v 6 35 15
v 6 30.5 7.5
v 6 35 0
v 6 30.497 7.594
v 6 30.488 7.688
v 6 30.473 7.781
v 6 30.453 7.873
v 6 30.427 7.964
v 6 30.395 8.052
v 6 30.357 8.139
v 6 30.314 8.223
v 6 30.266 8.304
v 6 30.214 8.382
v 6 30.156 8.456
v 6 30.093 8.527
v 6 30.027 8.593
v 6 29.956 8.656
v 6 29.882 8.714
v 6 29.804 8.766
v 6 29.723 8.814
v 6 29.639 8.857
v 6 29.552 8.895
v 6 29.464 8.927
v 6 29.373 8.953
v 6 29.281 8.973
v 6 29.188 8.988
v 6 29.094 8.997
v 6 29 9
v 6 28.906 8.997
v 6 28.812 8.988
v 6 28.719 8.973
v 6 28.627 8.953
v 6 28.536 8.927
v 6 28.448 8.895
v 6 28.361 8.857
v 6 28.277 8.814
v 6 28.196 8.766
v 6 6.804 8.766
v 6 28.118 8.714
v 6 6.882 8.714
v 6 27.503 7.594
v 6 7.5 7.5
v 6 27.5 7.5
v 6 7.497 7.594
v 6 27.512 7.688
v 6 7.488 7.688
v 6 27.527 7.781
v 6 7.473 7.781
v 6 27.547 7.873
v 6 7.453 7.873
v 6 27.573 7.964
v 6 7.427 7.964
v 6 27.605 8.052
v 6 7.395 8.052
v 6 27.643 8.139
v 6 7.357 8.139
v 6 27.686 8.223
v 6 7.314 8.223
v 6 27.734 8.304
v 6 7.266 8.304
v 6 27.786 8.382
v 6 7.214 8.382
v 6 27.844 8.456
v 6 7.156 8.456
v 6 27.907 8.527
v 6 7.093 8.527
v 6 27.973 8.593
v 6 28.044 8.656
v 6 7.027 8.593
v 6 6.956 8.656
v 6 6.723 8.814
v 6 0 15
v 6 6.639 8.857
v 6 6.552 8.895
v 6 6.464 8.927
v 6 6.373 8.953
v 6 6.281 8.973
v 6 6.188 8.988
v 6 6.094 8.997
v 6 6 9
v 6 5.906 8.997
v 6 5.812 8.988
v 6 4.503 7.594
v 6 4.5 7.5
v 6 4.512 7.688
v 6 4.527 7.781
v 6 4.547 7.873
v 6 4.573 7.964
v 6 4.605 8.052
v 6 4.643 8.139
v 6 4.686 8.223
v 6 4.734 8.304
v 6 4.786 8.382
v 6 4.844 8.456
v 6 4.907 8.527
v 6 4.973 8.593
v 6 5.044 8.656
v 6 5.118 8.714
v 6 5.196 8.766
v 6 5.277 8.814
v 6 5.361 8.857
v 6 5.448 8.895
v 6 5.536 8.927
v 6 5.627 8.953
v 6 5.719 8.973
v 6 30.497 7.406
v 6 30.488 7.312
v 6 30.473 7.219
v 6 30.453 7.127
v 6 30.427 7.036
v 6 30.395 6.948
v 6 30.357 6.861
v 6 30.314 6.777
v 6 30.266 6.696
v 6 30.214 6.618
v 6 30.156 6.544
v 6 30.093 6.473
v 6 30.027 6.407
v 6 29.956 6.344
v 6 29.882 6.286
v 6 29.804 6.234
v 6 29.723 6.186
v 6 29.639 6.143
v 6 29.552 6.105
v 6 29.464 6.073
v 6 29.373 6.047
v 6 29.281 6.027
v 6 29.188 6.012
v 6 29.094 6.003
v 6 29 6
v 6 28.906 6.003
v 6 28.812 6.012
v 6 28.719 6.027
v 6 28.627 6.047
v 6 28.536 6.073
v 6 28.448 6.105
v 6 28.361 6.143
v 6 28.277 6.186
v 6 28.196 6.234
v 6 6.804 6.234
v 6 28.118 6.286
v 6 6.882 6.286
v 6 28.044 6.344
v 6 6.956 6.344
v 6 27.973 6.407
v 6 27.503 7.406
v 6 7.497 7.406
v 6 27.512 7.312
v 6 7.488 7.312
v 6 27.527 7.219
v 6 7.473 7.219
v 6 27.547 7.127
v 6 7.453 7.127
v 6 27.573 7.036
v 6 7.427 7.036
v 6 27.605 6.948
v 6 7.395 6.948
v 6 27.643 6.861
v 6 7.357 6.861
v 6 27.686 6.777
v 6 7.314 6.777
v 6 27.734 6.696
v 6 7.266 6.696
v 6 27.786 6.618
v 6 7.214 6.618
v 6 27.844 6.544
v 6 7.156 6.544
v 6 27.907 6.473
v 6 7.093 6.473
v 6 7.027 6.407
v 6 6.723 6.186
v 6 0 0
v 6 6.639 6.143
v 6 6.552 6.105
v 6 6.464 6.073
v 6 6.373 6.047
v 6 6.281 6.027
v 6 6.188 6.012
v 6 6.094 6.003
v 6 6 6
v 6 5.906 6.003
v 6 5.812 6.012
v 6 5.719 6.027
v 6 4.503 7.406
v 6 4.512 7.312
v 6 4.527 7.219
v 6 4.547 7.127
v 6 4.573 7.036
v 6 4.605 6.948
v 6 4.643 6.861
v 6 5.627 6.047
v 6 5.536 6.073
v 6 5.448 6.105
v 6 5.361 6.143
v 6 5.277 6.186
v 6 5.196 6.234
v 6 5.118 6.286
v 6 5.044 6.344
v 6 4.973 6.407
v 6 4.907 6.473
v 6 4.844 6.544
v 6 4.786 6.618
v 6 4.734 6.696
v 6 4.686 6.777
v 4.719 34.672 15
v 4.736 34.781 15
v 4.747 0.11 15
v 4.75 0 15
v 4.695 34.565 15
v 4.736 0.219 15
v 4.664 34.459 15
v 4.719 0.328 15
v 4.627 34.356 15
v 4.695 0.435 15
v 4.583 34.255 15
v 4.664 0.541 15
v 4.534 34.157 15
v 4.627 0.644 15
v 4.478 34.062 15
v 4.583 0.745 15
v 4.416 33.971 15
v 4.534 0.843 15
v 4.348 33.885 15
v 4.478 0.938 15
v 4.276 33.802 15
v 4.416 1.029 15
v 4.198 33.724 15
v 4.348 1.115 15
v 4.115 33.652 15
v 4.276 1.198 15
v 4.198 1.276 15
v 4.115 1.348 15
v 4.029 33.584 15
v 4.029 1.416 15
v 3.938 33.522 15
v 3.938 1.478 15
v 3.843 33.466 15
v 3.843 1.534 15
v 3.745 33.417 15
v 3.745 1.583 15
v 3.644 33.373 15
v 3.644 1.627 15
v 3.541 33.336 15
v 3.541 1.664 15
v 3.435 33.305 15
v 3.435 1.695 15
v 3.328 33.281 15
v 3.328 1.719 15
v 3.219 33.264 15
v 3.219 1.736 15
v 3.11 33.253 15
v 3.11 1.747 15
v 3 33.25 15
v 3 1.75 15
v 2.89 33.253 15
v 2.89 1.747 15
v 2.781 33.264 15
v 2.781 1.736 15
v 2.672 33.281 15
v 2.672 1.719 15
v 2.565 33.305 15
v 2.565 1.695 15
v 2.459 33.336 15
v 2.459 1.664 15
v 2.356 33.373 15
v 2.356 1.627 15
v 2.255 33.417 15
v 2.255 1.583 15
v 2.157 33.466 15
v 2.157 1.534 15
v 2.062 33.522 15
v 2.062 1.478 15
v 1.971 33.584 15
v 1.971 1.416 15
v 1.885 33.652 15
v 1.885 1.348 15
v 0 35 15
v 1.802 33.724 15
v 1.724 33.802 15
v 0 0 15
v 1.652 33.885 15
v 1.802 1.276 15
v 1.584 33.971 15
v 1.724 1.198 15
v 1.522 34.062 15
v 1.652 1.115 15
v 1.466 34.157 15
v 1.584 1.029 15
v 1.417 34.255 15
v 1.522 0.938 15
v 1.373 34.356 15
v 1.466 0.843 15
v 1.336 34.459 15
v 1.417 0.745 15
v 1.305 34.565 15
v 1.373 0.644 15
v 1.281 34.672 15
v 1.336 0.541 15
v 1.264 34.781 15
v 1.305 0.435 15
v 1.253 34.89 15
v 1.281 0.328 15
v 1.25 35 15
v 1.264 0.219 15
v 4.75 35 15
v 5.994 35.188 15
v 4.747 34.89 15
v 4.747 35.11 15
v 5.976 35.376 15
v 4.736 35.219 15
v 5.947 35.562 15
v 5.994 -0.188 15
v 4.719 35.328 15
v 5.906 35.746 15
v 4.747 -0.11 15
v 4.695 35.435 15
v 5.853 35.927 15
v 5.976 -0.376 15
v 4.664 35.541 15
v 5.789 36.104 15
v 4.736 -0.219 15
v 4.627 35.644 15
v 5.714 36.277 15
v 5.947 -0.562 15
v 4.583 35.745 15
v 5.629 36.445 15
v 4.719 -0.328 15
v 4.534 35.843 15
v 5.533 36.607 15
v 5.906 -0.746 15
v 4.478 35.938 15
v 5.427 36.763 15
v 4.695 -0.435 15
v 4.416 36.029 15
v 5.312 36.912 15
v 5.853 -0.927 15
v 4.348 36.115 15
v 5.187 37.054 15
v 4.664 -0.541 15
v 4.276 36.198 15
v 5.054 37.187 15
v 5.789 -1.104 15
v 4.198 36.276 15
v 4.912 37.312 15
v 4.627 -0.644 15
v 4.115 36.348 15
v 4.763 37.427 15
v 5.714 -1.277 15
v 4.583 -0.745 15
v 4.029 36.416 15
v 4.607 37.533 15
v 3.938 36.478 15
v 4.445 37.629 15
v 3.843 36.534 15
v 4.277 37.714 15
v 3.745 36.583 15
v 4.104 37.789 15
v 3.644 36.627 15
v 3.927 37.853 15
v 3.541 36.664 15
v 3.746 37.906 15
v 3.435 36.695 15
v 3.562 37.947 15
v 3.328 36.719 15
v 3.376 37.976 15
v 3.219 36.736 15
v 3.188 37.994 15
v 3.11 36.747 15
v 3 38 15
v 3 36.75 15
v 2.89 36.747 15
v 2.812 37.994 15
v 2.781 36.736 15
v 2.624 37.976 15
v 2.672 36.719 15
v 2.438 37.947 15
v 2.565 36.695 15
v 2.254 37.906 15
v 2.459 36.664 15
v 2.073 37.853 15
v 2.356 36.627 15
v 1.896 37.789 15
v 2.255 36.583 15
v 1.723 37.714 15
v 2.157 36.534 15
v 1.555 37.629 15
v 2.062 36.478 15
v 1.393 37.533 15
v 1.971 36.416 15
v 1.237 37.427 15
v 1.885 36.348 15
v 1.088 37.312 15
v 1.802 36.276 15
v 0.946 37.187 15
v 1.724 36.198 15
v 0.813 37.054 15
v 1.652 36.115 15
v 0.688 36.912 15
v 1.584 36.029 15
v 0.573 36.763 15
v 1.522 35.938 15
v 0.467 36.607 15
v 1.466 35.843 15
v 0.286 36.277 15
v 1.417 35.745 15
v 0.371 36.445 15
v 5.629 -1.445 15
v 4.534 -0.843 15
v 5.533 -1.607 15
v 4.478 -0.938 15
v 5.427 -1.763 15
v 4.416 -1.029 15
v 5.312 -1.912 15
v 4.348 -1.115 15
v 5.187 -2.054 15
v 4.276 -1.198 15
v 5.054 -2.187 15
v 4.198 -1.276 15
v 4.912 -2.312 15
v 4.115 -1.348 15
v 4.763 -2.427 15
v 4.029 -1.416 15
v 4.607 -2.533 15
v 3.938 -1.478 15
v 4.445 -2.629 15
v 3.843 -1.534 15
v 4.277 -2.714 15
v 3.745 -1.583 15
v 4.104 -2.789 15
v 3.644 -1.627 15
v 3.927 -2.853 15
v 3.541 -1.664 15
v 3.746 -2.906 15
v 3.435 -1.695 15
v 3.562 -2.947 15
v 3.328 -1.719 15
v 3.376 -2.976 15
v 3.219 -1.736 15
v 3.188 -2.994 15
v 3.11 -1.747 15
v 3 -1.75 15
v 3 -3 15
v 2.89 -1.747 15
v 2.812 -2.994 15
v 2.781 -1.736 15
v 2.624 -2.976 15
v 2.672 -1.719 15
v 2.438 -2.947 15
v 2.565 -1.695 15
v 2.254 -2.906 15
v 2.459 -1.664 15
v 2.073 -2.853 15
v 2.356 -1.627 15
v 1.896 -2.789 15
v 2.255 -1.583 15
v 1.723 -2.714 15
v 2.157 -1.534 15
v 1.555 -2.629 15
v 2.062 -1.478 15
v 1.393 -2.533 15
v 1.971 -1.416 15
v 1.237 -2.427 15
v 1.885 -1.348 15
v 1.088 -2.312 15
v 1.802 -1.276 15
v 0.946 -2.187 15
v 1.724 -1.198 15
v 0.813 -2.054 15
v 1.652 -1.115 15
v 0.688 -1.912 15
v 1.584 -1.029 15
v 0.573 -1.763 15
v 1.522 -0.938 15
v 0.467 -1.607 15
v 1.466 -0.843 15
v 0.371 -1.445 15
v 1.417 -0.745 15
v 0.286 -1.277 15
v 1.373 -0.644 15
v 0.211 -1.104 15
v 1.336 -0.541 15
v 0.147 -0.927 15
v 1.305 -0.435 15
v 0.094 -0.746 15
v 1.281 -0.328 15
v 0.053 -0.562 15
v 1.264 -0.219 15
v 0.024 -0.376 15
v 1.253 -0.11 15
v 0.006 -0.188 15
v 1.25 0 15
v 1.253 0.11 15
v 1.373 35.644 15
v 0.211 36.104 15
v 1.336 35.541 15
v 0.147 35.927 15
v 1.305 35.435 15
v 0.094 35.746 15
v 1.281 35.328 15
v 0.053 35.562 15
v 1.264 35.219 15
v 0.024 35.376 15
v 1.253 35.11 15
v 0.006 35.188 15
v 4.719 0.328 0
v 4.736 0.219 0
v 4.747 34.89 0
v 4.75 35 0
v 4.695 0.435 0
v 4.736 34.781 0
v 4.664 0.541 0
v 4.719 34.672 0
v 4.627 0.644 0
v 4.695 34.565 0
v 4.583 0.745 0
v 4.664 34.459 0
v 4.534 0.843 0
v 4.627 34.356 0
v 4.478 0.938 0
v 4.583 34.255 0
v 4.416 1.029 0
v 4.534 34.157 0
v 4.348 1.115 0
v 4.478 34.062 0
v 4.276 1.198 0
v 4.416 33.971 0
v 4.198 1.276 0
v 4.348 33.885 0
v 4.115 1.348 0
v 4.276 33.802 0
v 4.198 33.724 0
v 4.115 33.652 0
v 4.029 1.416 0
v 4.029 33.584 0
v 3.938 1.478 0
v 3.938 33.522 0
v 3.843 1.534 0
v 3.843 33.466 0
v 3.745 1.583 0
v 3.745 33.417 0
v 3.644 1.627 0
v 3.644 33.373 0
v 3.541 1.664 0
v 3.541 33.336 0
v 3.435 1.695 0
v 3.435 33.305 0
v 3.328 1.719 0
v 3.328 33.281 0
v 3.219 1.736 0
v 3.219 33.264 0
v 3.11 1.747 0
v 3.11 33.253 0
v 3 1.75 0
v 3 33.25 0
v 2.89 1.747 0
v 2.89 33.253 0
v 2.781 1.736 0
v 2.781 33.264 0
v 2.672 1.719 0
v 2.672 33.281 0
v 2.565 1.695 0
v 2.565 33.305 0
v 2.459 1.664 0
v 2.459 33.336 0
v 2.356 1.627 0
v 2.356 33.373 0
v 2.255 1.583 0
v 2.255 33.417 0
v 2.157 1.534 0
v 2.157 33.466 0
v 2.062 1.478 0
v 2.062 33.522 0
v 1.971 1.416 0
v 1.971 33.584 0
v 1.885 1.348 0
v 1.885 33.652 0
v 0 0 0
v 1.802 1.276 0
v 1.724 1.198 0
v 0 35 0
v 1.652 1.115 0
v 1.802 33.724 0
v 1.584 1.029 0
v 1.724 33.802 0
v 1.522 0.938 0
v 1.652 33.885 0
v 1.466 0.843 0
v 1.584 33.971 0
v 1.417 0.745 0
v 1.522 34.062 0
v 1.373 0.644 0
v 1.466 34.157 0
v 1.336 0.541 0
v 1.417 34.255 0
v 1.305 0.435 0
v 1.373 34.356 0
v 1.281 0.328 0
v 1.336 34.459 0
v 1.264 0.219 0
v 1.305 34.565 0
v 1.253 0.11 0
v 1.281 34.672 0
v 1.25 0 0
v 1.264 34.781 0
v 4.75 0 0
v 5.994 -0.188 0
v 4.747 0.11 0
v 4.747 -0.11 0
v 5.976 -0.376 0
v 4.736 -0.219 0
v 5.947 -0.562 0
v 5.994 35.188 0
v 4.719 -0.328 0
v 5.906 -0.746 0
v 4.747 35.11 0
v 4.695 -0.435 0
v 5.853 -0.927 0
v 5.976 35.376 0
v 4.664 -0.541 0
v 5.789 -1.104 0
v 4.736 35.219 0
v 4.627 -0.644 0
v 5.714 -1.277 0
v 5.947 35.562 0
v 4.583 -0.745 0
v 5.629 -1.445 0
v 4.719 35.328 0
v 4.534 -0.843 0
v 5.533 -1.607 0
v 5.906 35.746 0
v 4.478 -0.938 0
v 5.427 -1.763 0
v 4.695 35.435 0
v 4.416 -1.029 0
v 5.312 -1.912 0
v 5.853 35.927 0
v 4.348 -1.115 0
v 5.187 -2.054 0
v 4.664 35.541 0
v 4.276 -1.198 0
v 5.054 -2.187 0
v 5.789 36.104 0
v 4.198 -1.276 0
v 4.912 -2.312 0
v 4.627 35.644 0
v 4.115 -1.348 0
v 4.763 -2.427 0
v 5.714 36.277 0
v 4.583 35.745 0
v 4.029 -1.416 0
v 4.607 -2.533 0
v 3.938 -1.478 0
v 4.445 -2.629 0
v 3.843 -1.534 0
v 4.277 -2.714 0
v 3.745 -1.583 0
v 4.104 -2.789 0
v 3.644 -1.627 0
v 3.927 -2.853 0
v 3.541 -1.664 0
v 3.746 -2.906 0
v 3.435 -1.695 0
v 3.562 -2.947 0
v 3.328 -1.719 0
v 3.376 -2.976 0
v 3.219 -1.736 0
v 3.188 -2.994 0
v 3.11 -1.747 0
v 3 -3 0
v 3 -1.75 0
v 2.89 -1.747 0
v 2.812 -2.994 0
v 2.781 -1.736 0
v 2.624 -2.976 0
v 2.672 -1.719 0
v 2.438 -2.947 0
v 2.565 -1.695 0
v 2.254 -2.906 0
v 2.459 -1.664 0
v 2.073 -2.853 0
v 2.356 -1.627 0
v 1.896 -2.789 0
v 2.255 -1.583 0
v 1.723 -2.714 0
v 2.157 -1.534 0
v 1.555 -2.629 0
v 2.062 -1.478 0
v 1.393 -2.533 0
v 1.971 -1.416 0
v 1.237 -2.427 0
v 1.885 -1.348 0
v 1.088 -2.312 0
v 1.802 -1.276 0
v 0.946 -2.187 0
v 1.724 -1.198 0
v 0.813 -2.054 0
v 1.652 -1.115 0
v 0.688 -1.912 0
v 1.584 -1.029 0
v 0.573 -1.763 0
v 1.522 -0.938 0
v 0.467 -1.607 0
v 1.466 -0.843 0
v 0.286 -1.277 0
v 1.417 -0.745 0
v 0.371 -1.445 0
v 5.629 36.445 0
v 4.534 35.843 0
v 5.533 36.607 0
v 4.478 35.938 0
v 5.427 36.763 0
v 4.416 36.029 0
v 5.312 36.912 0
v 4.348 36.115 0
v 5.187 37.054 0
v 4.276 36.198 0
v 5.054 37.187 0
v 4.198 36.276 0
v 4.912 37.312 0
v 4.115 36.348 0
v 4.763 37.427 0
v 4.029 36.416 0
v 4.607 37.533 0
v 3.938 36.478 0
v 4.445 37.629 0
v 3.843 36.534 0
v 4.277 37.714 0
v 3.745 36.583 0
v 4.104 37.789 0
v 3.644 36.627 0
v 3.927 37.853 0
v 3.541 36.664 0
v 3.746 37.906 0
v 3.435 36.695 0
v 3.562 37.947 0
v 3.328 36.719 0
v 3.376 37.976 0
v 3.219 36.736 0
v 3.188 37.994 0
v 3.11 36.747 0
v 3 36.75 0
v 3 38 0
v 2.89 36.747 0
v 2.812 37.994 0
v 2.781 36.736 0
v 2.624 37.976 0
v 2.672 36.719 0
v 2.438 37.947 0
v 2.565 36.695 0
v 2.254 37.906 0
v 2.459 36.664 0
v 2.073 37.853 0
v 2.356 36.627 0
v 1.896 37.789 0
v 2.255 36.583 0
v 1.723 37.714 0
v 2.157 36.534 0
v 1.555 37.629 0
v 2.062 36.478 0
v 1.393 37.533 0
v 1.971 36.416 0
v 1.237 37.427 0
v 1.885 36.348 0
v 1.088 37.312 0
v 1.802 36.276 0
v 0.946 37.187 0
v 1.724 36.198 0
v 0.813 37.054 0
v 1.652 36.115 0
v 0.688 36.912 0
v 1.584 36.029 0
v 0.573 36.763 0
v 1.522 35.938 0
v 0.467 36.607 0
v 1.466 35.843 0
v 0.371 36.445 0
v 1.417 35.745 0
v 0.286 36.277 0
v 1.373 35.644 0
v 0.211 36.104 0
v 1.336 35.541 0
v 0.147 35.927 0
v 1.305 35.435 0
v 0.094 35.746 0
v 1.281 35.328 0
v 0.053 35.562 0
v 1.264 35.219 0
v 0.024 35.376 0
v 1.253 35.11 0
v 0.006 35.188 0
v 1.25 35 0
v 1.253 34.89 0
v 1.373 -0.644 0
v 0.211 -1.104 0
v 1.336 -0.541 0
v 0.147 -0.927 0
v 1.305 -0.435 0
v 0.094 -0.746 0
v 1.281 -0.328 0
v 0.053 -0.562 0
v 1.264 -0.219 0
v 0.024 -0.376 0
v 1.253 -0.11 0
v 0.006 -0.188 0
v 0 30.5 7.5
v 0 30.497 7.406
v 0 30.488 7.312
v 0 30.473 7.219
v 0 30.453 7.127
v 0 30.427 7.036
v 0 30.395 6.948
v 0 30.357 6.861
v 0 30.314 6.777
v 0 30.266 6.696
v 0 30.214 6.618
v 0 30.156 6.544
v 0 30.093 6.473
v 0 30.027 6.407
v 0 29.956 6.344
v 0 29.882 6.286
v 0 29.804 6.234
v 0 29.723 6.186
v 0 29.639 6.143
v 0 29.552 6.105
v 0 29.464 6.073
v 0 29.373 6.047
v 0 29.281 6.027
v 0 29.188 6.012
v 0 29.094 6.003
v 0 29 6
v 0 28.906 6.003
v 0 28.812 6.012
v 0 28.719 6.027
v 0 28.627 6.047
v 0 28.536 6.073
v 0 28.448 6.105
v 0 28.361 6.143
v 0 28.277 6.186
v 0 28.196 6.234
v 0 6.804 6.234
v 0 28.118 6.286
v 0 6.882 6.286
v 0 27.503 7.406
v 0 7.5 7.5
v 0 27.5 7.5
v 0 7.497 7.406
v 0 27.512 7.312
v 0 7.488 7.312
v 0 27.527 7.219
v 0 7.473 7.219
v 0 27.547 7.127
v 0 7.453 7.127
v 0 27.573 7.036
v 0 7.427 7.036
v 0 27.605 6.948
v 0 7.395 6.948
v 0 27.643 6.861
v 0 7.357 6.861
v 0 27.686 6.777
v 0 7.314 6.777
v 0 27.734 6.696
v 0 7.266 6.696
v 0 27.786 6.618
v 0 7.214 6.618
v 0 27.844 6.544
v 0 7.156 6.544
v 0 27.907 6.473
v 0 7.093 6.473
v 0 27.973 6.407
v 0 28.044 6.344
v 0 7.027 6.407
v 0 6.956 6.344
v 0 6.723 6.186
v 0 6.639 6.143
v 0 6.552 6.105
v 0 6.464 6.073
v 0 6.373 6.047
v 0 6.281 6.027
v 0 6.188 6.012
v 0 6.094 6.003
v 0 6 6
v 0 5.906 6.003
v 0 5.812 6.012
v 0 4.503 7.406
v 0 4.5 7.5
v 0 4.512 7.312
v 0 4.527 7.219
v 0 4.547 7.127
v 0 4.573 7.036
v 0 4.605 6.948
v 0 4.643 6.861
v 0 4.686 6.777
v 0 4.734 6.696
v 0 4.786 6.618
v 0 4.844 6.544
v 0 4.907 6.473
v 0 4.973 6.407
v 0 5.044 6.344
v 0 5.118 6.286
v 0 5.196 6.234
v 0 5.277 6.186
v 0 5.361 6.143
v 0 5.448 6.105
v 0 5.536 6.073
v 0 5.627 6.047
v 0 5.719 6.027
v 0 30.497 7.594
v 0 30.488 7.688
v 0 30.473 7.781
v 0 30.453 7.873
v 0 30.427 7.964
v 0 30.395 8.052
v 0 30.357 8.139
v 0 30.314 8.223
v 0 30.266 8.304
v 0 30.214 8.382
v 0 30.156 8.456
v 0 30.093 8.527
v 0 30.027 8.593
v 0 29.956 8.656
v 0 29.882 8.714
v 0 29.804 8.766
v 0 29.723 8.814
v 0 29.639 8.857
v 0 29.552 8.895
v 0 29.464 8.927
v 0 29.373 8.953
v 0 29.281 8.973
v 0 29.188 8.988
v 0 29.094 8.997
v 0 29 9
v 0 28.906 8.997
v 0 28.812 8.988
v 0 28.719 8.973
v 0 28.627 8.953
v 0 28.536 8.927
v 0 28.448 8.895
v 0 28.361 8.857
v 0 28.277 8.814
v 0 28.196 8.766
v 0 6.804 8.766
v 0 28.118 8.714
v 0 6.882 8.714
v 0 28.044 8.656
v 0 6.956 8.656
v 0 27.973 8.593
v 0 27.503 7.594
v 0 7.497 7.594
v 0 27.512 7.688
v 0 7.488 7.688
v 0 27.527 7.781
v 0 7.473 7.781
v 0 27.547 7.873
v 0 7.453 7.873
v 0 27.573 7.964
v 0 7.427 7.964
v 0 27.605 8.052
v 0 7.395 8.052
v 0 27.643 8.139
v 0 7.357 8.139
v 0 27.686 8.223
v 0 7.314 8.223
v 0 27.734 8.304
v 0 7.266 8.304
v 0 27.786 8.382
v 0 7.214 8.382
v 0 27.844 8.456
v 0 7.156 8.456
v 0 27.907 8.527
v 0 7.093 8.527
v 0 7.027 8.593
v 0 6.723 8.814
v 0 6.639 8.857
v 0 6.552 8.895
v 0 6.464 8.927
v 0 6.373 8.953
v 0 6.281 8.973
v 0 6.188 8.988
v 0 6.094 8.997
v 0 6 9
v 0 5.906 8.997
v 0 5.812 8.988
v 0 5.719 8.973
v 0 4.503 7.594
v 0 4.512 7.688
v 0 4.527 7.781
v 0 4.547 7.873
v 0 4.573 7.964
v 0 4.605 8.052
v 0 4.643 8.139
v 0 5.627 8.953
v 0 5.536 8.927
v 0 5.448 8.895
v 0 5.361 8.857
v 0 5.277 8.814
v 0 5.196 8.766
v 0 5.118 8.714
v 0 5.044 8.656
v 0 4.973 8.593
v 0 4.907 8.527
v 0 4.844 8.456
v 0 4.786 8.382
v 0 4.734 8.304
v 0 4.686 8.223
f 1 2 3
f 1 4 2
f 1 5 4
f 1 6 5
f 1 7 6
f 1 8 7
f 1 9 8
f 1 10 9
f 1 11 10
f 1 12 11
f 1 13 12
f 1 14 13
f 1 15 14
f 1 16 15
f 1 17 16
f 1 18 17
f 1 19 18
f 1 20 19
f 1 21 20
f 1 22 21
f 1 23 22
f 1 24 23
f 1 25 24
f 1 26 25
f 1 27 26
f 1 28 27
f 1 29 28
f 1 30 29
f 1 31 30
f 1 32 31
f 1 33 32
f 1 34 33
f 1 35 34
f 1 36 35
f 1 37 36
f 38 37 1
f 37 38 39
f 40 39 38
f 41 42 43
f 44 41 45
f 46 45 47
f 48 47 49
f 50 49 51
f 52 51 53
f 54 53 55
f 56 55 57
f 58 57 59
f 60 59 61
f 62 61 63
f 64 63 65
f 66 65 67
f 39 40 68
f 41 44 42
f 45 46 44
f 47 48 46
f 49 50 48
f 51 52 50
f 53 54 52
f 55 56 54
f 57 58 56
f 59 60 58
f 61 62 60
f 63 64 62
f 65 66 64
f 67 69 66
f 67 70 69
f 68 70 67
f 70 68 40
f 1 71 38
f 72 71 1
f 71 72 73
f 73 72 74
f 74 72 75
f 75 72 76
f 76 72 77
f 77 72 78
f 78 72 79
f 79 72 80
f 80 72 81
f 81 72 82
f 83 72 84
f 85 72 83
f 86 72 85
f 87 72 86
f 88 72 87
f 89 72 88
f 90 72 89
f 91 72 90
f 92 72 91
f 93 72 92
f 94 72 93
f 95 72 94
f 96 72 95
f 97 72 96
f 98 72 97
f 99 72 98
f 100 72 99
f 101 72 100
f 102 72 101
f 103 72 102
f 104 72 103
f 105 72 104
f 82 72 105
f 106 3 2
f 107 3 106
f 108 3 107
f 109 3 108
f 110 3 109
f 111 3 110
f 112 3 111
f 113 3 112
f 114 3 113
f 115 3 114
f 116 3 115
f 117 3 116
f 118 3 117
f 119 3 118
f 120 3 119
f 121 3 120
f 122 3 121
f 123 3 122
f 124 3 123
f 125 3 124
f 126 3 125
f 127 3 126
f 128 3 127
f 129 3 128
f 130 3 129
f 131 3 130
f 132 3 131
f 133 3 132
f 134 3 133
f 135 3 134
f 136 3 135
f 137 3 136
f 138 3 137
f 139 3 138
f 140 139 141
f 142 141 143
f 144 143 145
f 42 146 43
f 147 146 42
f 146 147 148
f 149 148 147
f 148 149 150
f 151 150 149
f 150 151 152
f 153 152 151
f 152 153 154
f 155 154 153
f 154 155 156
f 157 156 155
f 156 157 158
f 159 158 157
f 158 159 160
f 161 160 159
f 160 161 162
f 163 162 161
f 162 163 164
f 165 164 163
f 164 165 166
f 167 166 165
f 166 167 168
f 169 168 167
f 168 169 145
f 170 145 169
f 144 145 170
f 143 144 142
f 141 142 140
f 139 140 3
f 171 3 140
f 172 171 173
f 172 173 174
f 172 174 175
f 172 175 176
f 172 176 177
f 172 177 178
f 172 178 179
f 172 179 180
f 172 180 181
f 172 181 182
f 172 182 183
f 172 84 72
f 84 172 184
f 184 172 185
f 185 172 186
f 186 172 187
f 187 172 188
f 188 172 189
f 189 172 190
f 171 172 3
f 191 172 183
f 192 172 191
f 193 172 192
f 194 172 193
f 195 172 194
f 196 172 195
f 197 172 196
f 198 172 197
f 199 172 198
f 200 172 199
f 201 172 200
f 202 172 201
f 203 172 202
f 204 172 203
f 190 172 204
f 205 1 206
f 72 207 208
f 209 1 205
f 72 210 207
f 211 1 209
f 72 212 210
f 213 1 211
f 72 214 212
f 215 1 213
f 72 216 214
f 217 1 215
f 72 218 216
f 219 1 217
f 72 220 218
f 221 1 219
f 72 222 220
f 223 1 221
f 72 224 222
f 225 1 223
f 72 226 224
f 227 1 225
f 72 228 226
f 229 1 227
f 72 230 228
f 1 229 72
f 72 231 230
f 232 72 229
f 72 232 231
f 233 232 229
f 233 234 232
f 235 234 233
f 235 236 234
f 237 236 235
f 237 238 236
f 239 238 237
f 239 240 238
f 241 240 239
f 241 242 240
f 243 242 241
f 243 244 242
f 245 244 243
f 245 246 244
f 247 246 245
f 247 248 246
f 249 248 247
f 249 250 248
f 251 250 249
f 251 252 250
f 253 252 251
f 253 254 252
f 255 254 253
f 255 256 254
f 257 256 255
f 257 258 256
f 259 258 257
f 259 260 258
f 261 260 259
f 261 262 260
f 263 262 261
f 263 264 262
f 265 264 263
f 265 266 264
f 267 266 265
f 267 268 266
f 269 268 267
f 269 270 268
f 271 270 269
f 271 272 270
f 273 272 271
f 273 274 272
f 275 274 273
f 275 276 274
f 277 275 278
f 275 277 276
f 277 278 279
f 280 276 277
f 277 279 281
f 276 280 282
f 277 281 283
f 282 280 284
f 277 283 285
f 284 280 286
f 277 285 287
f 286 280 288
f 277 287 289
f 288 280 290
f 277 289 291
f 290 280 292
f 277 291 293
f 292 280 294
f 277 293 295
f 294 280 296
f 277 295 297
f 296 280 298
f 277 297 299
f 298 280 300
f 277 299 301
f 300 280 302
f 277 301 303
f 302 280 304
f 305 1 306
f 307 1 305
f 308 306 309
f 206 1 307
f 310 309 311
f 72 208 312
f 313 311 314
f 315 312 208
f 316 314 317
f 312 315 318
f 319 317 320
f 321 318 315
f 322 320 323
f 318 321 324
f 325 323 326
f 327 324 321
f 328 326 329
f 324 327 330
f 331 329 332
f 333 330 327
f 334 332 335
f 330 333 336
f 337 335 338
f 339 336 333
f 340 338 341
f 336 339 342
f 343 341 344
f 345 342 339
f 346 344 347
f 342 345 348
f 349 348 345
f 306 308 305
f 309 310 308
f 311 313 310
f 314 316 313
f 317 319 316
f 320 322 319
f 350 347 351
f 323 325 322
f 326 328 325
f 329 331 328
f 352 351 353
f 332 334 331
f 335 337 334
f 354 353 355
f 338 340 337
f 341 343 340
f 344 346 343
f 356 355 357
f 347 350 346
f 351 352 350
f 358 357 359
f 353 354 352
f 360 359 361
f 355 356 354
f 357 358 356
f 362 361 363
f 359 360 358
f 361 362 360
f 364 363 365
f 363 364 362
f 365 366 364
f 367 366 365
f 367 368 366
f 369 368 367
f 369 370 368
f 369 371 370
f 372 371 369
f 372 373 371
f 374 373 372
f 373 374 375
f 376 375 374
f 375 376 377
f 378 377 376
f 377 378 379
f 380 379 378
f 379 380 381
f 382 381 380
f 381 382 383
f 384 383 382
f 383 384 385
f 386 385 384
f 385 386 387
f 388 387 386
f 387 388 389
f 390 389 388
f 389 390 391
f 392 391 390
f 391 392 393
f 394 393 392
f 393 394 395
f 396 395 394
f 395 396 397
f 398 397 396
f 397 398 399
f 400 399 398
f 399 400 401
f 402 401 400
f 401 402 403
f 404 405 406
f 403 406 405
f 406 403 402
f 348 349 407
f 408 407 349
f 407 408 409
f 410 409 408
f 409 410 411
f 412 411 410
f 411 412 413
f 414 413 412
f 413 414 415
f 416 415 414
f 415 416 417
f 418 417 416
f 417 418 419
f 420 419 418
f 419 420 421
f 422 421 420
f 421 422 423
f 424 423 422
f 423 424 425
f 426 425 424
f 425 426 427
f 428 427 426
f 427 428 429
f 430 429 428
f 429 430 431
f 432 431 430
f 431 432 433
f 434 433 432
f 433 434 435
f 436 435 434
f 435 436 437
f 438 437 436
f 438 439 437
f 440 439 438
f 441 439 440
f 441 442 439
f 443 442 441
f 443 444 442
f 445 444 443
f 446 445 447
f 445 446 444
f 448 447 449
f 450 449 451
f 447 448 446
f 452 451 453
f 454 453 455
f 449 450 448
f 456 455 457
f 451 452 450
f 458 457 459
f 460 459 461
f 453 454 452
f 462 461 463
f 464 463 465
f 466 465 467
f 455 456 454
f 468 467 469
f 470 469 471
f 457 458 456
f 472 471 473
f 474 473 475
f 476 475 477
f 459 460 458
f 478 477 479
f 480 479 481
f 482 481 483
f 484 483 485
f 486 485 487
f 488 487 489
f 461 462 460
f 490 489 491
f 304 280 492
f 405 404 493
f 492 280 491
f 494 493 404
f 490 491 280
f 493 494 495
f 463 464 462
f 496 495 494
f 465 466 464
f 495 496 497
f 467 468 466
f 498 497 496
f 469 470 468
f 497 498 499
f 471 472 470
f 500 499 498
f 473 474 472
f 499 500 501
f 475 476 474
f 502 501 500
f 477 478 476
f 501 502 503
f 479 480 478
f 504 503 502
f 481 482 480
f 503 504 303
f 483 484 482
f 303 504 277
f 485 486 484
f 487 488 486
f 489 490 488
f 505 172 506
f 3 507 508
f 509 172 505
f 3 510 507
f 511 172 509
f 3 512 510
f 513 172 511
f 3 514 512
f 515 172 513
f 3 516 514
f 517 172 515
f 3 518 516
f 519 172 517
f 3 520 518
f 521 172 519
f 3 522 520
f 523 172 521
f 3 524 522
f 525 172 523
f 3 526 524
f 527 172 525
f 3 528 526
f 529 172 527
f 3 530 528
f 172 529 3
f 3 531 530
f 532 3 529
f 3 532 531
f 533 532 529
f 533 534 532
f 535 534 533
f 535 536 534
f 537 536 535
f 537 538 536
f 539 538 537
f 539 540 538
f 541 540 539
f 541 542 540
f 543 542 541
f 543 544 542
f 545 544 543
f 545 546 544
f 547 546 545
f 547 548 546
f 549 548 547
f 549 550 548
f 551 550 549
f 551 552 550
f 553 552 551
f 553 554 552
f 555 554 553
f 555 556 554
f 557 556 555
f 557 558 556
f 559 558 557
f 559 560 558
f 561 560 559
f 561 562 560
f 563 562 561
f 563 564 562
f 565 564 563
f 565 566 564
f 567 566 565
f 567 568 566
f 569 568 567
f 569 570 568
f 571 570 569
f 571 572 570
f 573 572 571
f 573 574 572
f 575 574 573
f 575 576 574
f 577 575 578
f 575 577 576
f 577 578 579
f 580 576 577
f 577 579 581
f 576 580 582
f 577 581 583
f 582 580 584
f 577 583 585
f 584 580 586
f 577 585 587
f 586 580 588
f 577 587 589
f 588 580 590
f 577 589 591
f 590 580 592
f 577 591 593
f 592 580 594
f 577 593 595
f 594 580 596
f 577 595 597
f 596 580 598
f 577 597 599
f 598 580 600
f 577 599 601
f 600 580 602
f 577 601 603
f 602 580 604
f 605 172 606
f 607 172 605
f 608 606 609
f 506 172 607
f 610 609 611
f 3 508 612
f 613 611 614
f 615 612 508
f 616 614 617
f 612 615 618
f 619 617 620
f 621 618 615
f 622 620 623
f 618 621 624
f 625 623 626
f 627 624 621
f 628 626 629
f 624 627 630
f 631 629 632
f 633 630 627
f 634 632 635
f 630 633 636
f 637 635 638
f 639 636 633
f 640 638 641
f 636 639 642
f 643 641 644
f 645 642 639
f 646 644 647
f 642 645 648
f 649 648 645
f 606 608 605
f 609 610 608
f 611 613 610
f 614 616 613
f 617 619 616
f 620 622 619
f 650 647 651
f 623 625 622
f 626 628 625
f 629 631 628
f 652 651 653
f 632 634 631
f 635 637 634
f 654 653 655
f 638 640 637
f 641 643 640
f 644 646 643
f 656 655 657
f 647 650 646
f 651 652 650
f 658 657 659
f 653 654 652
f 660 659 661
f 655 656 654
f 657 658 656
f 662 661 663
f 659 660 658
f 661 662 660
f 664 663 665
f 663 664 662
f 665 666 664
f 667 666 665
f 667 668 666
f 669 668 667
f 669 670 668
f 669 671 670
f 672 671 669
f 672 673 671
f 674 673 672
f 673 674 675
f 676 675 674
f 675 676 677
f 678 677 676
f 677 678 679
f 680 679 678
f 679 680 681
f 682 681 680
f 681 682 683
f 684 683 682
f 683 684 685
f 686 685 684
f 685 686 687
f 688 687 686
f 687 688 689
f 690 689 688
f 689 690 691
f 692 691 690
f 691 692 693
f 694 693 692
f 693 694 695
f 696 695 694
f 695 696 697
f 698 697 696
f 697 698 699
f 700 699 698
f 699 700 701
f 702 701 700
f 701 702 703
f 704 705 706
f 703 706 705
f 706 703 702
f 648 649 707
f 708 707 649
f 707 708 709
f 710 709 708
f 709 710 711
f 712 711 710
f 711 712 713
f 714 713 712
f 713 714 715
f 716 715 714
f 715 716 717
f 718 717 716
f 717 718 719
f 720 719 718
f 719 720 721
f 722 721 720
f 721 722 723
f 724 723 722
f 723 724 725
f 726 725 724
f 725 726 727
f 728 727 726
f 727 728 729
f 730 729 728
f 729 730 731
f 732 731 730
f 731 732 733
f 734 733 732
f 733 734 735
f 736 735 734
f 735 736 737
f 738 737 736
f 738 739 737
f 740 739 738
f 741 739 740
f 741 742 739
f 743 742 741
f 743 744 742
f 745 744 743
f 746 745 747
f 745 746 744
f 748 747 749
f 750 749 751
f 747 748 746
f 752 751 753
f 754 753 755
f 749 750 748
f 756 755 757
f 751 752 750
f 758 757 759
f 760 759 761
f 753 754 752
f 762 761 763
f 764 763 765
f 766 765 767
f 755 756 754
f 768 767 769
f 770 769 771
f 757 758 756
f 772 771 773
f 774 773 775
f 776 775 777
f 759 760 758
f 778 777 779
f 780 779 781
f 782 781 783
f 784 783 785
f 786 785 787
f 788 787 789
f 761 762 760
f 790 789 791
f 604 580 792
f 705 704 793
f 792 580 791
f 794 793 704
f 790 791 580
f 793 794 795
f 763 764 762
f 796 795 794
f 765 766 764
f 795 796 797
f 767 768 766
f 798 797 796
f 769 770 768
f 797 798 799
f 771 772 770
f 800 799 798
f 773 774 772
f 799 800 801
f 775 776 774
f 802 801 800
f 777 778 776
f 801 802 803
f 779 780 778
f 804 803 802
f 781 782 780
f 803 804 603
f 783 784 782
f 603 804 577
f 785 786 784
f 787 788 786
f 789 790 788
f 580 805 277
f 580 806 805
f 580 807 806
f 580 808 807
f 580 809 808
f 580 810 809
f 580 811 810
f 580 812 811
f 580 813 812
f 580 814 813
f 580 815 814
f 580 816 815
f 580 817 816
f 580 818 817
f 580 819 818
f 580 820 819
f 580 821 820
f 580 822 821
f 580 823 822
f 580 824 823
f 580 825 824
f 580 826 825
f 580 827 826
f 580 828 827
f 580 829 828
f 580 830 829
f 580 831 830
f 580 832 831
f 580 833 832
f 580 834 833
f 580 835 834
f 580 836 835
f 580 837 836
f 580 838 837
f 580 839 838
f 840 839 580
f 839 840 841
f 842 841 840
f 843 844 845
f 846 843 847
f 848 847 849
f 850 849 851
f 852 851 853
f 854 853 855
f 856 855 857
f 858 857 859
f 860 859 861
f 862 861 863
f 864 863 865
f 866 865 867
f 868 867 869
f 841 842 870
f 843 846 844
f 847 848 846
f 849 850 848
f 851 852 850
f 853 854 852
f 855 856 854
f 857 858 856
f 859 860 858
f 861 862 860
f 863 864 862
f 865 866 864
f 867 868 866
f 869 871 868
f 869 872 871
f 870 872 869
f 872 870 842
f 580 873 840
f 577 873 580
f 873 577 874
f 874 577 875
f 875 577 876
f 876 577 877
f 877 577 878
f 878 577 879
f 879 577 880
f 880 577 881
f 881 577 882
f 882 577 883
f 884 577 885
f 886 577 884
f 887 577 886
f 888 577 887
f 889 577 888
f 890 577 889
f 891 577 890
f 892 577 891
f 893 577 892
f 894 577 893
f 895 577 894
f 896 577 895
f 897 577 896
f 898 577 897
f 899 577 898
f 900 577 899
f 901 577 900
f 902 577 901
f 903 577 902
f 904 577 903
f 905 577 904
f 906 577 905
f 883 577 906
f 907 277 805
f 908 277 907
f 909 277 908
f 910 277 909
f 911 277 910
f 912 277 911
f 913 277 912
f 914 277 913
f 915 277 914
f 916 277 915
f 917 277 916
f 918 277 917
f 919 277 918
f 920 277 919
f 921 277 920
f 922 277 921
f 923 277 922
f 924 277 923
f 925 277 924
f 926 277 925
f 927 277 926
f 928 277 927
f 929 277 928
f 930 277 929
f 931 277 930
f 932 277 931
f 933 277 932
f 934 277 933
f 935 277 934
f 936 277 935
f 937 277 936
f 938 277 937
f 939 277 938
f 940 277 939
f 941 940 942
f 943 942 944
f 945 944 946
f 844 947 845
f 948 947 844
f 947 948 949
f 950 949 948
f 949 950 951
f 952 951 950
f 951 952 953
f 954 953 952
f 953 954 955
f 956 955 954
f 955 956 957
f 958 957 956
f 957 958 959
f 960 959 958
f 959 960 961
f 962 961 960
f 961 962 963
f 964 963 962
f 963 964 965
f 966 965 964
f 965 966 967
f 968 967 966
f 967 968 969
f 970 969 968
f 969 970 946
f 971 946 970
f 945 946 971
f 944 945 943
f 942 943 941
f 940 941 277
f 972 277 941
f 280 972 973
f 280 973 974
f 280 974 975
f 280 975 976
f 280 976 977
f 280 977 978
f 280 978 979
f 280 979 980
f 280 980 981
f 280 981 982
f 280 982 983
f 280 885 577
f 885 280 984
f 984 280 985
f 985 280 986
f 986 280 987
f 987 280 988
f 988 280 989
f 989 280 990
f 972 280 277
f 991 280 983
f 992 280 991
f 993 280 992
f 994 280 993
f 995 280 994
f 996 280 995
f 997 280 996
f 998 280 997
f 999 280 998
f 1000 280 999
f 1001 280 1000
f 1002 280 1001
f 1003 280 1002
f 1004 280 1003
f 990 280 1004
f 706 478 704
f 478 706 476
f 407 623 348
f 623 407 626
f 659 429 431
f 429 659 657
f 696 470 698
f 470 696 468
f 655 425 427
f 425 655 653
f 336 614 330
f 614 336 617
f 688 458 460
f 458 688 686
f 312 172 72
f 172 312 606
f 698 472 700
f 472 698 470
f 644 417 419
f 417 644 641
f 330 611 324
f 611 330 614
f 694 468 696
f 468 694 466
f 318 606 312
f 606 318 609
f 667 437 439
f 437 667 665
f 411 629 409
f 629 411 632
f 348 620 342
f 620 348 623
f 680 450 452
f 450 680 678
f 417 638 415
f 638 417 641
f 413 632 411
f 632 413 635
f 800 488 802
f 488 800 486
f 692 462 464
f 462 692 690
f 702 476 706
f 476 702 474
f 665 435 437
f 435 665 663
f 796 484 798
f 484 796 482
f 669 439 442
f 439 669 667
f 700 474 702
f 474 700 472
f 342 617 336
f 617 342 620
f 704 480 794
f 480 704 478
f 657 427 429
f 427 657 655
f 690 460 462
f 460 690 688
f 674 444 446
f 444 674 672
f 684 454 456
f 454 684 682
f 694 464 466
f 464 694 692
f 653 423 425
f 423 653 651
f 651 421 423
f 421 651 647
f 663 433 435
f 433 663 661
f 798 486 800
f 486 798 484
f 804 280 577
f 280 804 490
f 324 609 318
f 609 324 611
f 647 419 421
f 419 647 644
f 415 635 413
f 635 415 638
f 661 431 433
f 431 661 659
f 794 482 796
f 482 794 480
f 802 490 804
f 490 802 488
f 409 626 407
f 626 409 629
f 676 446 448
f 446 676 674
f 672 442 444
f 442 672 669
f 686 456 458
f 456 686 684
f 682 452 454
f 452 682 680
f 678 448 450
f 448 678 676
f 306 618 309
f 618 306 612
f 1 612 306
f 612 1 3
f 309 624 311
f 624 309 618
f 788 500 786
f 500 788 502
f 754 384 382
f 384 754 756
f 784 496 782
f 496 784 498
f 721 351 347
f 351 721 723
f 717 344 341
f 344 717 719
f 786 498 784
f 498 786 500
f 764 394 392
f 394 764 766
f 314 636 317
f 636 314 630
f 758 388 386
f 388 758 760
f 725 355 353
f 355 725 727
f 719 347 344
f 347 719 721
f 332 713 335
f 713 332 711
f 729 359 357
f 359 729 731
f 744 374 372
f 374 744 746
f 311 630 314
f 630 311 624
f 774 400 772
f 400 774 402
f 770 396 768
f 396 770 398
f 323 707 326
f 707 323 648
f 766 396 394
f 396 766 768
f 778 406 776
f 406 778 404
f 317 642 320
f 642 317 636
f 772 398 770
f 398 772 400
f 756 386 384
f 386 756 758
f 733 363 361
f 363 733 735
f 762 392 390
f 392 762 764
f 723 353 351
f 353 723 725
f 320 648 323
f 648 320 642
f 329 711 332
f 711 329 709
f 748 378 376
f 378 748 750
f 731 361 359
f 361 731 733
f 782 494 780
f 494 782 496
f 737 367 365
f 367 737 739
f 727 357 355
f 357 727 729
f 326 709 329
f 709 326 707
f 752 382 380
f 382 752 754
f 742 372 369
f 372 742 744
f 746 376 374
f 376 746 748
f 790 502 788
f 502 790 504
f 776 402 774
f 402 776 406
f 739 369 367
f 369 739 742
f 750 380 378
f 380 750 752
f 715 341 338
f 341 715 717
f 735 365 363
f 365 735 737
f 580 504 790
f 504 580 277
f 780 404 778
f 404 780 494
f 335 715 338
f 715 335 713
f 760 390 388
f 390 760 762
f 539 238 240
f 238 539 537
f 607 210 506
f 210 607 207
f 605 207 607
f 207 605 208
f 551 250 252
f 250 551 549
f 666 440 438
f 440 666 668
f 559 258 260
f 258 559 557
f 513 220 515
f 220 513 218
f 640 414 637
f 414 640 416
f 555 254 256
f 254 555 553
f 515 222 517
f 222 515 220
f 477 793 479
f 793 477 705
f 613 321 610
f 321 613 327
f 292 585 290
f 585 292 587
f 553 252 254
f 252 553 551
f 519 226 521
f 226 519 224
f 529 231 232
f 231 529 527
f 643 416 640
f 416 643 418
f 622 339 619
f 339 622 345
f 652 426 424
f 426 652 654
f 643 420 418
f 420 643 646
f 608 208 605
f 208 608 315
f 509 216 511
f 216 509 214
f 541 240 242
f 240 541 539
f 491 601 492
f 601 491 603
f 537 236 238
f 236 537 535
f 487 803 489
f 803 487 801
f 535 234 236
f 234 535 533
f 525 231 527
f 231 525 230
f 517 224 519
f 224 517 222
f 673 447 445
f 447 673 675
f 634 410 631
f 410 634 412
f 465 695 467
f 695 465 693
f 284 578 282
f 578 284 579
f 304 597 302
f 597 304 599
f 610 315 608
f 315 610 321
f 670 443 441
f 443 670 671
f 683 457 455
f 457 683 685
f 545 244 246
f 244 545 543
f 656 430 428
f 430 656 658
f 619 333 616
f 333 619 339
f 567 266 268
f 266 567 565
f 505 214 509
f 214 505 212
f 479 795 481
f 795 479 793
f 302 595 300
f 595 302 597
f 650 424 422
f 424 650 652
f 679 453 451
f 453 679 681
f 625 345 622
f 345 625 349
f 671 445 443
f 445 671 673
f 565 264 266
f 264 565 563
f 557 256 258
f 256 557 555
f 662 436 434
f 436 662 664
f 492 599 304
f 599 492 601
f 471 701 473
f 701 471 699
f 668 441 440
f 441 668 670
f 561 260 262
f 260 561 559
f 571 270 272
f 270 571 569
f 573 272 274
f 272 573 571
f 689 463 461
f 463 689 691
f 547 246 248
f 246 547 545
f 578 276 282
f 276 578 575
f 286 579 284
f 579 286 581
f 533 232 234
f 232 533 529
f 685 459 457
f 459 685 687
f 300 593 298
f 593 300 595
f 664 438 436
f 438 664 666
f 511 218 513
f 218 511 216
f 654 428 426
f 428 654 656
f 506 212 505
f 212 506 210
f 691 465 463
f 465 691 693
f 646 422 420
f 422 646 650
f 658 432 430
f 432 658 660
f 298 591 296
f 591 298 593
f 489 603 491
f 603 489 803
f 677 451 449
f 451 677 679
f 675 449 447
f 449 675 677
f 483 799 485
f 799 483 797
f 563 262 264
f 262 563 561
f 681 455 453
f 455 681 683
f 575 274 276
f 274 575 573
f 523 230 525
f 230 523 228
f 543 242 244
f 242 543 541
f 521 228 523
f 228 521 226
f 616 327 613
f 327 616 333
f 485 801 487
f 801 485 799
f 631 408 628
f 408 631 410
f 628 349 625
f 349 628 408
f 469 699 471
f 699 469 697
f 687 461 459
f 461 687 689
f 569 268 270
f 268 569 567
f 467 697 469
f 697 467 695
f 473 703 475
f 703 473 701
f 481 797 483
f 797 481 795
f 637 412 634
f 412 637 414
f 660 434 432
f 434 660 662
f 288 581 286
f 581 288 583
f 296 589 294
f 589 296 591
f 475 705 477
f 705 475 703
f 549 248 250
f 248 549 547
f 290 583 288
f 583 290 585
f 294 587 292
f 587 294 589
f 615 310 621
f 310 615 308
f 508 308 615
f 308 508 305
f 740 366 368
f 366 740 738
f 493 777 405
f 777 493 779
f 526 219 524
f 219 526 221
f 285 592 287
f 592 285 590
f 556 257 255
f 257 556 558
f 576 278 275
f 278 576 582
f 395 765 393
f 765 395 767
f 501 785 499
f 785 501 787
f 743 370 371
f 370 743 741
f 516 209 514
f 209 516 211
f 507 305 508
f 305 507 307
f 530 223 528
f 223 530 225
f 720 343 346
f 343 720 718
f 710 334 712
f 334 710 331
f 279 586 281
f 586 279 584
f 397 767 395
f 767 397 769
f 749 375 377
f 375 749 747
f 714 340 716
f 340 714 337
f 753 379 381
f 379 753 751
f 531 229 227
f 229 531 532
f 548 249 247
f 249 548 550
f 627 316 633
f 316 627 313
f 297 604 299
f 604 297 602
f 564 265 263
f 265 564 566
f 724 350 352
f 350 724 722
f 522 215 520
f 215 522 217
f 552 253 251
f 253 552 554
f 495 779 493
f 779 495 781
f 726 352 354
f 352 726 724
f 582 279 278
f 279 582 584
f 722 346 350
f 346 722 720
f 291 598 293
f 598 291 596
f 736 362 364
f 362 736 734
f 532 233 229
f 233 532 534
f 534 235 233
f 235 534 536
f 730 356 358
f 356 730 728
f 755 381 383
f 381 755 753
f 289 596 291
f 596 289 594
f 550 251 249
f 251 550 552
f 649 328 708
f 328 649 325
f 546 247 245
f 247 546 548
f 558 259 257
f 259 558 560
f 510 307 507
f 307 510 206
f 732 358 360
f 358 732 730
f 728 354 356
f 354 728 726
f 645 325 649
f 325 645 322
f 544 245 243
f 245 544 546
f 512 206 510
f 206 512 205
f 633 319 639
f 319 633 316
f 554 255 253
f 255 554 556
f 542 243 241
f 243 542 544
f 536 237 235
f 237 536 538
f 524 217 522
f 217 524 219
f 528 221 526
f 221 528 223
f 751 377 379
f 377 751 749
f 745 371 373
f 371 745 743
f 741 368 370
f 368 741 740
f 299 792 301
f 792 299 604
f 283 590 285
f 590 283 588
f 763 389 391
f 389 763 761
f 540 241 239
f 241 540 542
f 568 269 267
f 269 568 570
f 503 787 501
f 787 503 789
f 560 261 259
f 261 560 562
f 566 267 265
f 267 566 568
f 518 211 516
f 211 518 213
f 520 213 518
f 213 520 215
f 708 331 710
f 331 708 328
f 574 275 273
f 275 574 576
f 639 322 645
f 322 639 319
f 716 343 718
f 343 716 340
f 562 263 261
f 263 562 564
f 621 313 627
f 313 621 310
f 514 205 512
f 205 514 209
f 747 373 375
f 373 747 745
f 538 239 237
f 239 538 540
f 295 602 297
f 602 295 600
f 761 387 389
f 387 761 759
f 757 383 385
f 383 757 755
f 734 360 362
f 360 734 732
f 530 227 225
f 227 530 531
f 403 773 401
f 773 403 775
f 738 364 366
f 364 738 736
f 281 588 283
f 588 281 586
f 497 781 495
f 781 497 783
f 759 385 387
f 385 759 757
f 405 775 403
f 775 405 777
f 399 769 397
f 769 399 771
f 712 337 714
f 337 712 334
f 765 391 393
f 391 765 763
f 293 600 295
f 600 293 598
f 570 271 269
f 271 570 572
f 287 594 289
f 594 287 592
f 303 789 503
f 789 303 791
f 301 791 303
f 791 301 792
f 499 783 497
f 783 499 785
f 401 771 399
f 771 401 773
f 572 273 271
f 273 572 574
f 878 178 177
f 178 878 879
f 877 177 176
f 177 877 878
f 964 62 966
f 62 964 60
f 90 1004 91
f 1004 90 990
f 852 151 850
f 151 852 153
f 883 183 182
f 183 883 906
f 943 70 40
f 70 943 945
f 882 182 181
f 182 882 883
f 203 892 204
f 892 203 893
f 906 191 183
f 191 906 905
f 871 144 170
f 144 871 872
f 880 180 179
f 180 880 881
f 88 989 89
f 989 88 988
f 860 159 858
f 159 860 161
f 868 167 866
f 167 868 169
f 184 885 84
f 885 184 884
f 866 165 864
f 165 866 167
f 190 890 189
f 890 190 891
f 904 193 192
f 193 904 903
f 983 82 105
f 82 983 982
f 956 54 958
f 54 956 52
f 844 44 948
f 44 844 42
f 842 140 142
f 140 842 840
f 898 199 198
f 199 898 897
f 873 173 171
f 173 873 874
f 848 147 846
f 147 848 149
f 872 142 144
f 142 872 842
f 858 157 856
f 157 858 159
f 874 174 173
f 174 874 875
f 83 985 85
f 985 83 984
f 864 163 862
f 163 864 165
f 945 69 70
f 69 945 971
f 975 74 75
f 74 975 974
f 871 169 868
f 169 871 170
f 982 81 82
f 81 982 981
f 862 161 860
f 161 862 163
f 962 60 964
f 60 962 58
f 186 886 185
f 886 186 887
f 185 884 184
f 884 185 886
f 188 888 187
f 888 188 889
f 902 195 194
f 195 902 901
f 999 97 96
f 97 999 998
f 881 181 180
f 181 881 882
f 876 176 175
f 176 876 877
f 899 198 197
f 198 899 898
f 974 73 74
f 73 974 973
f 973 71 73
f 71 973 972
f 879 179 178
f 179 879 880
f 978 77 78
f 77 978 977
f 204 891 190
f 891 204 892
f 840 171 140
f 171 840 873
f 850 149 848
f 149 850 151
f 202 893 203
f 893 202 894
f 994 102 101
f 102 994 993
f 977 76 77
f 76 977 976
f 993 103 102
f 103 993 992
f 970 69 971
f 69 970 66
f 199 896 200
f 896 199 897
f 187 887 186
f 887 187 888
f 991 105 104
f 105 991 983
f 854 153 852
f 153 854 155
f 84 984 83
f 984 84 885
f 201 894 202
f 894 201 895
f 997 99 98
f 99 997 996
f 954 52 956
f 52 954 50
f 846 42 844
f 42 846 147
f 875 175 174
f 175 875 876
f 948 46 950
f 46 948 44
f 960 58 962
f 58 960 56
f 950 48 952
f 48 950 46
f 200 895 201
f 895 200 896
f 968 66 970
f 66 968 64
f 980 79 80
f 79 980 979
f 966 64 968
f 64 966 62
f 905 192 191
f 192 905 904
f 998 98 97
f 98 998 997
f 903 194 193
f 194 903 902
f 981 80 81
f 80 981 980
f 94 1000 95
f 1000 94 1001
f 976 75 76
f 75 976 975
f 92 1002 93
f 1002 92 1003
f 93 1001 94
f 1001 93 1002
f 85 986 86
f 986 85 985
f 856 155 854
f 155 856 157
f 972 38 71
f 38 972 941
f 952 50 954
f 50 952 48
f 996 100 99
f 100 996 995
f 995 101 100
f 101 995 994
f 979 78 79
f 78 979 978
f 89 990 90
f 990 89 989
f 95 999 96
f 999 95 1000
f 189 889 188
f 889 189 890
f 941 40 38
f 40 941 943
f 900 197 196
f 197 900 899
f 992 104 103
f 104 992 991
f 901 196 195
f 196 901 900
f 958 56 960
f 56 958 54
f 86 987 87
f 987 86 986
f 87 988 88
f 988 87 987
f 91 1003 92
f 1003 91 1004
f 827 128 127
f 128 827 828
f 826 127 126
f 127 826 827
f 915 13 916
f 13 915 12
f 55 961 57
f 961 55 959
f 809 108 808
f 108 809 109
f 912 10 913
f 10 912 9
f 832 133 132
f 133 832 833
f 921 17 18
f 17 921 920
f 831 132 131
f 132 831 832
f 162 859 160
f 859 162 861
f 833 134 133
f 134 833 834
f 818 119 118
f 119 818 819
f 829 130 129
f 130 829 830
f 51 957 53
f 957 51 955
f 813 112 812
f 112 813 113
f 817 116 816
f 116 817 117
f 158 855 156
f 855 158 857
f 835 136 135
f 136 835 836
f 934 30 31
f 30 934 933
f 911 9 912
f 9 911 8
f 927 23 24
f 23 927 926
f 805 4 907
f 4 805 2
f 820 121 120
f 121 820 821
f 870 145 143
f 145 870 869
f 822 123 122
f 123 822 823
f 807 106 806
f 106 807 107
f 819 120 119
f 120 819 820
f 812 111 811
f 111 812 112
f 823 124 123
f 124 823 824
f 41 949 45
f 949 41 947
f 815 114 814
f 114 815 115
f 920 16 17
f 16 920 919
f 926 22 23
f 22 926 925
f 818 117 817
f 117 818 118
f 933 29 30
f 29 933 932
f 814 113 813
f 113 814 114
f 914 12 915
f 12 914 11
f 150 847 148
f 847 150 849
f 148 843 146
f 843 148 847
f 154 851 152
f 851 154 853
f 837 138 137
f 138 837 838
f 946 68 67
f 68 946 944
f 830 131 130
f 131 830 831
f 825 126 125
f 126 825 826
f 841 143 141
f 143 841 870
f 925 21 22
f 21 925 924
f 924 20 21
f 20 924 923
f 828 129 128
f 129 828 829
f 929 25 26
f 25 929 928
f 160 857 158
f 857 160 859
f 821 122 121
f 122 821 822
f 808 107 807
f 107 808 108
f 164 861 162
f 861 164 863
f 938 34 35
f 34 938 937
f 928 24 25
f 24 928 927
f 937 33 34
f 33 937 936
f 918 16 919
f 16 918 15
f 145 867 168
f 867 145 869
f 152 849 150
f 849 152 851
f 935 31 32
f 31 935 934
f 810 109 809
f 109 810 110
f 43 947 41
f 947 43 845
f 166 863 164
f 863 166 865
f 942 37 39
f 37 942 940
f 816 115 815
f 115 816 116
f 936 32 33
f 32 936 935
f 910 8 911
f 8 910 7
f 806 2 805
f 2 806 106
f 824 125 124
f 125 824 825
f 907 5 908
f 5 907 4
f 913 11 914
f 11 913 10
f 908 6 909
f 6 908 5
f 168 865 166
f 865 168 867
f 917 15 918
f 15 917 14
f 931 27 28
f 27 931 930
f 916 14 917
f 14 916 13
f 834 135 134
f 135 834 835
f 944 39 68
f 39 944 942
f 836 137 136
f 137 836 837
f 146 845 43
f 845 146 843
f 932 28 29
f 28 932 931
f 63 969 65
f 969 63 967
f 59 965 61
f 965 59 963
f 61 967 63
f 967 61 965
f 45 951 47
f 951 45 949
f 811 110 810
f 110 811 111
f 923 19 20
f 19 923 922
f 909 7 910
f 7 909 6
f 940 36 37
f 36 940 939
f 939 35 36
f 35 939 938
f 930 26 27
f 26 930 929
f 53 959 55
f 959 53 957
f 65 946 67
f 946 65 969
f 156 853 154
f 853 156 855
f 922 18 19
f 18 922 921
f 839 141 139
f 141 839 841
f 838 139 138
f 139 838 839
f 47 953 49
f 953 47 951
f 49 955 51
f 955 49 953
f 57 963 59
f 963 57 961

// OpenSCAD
/*

Description: those spacers are used to assemble my rocket payload altimeters plate. You will need a minimum of 2 of those
Author: Boris du Reau
Date: 24/08/2018
Lenght between rod holes: 35mm
*/
$fn=100; 
// diameter of the holes used to screw the altimeter plate
plate_hole_diam= 3;
spacer_width = 15;
spacer_rod_diam = 3.5;
//lenght between the rod hols
spacer_length= 35;
spacer_height=6;

// main spacer
module spacer() {
cube ([spacer_height,spacer_length,spacer_width ]);
translate ([spacer_height/2, 0,0]) cylinder (h=spacer_width, r=spacer_height/2);
translate ([spacer_height/2, spacer_length,0]) cylinder (h=spacer_width, r=spacer_height/2);
}

difference () {
    spacer();
    // rod holes
    translate ([spacer_height/2, 0,0])cylinder(h=spacer_width, r=spacer_rod_diam/2);
    translate ([spacer_height/2, spacer_length,0])cylinder(h=spacer_width, r=spacer_rod_diam/2);
    //holes to screw the altimeters plate
    rotate ([0,90,0]) translate ([-spacer_width/2,spacer_height,0])cylinder(h=spacer_width, r=plate_hole_diam/2);
    rotate ([0,90,0]) translate ([-spacer_width/2,spacer_length-spacer_height,0])cylinder(h=spacer_width, r=plate_hole_diam/2);  
}
